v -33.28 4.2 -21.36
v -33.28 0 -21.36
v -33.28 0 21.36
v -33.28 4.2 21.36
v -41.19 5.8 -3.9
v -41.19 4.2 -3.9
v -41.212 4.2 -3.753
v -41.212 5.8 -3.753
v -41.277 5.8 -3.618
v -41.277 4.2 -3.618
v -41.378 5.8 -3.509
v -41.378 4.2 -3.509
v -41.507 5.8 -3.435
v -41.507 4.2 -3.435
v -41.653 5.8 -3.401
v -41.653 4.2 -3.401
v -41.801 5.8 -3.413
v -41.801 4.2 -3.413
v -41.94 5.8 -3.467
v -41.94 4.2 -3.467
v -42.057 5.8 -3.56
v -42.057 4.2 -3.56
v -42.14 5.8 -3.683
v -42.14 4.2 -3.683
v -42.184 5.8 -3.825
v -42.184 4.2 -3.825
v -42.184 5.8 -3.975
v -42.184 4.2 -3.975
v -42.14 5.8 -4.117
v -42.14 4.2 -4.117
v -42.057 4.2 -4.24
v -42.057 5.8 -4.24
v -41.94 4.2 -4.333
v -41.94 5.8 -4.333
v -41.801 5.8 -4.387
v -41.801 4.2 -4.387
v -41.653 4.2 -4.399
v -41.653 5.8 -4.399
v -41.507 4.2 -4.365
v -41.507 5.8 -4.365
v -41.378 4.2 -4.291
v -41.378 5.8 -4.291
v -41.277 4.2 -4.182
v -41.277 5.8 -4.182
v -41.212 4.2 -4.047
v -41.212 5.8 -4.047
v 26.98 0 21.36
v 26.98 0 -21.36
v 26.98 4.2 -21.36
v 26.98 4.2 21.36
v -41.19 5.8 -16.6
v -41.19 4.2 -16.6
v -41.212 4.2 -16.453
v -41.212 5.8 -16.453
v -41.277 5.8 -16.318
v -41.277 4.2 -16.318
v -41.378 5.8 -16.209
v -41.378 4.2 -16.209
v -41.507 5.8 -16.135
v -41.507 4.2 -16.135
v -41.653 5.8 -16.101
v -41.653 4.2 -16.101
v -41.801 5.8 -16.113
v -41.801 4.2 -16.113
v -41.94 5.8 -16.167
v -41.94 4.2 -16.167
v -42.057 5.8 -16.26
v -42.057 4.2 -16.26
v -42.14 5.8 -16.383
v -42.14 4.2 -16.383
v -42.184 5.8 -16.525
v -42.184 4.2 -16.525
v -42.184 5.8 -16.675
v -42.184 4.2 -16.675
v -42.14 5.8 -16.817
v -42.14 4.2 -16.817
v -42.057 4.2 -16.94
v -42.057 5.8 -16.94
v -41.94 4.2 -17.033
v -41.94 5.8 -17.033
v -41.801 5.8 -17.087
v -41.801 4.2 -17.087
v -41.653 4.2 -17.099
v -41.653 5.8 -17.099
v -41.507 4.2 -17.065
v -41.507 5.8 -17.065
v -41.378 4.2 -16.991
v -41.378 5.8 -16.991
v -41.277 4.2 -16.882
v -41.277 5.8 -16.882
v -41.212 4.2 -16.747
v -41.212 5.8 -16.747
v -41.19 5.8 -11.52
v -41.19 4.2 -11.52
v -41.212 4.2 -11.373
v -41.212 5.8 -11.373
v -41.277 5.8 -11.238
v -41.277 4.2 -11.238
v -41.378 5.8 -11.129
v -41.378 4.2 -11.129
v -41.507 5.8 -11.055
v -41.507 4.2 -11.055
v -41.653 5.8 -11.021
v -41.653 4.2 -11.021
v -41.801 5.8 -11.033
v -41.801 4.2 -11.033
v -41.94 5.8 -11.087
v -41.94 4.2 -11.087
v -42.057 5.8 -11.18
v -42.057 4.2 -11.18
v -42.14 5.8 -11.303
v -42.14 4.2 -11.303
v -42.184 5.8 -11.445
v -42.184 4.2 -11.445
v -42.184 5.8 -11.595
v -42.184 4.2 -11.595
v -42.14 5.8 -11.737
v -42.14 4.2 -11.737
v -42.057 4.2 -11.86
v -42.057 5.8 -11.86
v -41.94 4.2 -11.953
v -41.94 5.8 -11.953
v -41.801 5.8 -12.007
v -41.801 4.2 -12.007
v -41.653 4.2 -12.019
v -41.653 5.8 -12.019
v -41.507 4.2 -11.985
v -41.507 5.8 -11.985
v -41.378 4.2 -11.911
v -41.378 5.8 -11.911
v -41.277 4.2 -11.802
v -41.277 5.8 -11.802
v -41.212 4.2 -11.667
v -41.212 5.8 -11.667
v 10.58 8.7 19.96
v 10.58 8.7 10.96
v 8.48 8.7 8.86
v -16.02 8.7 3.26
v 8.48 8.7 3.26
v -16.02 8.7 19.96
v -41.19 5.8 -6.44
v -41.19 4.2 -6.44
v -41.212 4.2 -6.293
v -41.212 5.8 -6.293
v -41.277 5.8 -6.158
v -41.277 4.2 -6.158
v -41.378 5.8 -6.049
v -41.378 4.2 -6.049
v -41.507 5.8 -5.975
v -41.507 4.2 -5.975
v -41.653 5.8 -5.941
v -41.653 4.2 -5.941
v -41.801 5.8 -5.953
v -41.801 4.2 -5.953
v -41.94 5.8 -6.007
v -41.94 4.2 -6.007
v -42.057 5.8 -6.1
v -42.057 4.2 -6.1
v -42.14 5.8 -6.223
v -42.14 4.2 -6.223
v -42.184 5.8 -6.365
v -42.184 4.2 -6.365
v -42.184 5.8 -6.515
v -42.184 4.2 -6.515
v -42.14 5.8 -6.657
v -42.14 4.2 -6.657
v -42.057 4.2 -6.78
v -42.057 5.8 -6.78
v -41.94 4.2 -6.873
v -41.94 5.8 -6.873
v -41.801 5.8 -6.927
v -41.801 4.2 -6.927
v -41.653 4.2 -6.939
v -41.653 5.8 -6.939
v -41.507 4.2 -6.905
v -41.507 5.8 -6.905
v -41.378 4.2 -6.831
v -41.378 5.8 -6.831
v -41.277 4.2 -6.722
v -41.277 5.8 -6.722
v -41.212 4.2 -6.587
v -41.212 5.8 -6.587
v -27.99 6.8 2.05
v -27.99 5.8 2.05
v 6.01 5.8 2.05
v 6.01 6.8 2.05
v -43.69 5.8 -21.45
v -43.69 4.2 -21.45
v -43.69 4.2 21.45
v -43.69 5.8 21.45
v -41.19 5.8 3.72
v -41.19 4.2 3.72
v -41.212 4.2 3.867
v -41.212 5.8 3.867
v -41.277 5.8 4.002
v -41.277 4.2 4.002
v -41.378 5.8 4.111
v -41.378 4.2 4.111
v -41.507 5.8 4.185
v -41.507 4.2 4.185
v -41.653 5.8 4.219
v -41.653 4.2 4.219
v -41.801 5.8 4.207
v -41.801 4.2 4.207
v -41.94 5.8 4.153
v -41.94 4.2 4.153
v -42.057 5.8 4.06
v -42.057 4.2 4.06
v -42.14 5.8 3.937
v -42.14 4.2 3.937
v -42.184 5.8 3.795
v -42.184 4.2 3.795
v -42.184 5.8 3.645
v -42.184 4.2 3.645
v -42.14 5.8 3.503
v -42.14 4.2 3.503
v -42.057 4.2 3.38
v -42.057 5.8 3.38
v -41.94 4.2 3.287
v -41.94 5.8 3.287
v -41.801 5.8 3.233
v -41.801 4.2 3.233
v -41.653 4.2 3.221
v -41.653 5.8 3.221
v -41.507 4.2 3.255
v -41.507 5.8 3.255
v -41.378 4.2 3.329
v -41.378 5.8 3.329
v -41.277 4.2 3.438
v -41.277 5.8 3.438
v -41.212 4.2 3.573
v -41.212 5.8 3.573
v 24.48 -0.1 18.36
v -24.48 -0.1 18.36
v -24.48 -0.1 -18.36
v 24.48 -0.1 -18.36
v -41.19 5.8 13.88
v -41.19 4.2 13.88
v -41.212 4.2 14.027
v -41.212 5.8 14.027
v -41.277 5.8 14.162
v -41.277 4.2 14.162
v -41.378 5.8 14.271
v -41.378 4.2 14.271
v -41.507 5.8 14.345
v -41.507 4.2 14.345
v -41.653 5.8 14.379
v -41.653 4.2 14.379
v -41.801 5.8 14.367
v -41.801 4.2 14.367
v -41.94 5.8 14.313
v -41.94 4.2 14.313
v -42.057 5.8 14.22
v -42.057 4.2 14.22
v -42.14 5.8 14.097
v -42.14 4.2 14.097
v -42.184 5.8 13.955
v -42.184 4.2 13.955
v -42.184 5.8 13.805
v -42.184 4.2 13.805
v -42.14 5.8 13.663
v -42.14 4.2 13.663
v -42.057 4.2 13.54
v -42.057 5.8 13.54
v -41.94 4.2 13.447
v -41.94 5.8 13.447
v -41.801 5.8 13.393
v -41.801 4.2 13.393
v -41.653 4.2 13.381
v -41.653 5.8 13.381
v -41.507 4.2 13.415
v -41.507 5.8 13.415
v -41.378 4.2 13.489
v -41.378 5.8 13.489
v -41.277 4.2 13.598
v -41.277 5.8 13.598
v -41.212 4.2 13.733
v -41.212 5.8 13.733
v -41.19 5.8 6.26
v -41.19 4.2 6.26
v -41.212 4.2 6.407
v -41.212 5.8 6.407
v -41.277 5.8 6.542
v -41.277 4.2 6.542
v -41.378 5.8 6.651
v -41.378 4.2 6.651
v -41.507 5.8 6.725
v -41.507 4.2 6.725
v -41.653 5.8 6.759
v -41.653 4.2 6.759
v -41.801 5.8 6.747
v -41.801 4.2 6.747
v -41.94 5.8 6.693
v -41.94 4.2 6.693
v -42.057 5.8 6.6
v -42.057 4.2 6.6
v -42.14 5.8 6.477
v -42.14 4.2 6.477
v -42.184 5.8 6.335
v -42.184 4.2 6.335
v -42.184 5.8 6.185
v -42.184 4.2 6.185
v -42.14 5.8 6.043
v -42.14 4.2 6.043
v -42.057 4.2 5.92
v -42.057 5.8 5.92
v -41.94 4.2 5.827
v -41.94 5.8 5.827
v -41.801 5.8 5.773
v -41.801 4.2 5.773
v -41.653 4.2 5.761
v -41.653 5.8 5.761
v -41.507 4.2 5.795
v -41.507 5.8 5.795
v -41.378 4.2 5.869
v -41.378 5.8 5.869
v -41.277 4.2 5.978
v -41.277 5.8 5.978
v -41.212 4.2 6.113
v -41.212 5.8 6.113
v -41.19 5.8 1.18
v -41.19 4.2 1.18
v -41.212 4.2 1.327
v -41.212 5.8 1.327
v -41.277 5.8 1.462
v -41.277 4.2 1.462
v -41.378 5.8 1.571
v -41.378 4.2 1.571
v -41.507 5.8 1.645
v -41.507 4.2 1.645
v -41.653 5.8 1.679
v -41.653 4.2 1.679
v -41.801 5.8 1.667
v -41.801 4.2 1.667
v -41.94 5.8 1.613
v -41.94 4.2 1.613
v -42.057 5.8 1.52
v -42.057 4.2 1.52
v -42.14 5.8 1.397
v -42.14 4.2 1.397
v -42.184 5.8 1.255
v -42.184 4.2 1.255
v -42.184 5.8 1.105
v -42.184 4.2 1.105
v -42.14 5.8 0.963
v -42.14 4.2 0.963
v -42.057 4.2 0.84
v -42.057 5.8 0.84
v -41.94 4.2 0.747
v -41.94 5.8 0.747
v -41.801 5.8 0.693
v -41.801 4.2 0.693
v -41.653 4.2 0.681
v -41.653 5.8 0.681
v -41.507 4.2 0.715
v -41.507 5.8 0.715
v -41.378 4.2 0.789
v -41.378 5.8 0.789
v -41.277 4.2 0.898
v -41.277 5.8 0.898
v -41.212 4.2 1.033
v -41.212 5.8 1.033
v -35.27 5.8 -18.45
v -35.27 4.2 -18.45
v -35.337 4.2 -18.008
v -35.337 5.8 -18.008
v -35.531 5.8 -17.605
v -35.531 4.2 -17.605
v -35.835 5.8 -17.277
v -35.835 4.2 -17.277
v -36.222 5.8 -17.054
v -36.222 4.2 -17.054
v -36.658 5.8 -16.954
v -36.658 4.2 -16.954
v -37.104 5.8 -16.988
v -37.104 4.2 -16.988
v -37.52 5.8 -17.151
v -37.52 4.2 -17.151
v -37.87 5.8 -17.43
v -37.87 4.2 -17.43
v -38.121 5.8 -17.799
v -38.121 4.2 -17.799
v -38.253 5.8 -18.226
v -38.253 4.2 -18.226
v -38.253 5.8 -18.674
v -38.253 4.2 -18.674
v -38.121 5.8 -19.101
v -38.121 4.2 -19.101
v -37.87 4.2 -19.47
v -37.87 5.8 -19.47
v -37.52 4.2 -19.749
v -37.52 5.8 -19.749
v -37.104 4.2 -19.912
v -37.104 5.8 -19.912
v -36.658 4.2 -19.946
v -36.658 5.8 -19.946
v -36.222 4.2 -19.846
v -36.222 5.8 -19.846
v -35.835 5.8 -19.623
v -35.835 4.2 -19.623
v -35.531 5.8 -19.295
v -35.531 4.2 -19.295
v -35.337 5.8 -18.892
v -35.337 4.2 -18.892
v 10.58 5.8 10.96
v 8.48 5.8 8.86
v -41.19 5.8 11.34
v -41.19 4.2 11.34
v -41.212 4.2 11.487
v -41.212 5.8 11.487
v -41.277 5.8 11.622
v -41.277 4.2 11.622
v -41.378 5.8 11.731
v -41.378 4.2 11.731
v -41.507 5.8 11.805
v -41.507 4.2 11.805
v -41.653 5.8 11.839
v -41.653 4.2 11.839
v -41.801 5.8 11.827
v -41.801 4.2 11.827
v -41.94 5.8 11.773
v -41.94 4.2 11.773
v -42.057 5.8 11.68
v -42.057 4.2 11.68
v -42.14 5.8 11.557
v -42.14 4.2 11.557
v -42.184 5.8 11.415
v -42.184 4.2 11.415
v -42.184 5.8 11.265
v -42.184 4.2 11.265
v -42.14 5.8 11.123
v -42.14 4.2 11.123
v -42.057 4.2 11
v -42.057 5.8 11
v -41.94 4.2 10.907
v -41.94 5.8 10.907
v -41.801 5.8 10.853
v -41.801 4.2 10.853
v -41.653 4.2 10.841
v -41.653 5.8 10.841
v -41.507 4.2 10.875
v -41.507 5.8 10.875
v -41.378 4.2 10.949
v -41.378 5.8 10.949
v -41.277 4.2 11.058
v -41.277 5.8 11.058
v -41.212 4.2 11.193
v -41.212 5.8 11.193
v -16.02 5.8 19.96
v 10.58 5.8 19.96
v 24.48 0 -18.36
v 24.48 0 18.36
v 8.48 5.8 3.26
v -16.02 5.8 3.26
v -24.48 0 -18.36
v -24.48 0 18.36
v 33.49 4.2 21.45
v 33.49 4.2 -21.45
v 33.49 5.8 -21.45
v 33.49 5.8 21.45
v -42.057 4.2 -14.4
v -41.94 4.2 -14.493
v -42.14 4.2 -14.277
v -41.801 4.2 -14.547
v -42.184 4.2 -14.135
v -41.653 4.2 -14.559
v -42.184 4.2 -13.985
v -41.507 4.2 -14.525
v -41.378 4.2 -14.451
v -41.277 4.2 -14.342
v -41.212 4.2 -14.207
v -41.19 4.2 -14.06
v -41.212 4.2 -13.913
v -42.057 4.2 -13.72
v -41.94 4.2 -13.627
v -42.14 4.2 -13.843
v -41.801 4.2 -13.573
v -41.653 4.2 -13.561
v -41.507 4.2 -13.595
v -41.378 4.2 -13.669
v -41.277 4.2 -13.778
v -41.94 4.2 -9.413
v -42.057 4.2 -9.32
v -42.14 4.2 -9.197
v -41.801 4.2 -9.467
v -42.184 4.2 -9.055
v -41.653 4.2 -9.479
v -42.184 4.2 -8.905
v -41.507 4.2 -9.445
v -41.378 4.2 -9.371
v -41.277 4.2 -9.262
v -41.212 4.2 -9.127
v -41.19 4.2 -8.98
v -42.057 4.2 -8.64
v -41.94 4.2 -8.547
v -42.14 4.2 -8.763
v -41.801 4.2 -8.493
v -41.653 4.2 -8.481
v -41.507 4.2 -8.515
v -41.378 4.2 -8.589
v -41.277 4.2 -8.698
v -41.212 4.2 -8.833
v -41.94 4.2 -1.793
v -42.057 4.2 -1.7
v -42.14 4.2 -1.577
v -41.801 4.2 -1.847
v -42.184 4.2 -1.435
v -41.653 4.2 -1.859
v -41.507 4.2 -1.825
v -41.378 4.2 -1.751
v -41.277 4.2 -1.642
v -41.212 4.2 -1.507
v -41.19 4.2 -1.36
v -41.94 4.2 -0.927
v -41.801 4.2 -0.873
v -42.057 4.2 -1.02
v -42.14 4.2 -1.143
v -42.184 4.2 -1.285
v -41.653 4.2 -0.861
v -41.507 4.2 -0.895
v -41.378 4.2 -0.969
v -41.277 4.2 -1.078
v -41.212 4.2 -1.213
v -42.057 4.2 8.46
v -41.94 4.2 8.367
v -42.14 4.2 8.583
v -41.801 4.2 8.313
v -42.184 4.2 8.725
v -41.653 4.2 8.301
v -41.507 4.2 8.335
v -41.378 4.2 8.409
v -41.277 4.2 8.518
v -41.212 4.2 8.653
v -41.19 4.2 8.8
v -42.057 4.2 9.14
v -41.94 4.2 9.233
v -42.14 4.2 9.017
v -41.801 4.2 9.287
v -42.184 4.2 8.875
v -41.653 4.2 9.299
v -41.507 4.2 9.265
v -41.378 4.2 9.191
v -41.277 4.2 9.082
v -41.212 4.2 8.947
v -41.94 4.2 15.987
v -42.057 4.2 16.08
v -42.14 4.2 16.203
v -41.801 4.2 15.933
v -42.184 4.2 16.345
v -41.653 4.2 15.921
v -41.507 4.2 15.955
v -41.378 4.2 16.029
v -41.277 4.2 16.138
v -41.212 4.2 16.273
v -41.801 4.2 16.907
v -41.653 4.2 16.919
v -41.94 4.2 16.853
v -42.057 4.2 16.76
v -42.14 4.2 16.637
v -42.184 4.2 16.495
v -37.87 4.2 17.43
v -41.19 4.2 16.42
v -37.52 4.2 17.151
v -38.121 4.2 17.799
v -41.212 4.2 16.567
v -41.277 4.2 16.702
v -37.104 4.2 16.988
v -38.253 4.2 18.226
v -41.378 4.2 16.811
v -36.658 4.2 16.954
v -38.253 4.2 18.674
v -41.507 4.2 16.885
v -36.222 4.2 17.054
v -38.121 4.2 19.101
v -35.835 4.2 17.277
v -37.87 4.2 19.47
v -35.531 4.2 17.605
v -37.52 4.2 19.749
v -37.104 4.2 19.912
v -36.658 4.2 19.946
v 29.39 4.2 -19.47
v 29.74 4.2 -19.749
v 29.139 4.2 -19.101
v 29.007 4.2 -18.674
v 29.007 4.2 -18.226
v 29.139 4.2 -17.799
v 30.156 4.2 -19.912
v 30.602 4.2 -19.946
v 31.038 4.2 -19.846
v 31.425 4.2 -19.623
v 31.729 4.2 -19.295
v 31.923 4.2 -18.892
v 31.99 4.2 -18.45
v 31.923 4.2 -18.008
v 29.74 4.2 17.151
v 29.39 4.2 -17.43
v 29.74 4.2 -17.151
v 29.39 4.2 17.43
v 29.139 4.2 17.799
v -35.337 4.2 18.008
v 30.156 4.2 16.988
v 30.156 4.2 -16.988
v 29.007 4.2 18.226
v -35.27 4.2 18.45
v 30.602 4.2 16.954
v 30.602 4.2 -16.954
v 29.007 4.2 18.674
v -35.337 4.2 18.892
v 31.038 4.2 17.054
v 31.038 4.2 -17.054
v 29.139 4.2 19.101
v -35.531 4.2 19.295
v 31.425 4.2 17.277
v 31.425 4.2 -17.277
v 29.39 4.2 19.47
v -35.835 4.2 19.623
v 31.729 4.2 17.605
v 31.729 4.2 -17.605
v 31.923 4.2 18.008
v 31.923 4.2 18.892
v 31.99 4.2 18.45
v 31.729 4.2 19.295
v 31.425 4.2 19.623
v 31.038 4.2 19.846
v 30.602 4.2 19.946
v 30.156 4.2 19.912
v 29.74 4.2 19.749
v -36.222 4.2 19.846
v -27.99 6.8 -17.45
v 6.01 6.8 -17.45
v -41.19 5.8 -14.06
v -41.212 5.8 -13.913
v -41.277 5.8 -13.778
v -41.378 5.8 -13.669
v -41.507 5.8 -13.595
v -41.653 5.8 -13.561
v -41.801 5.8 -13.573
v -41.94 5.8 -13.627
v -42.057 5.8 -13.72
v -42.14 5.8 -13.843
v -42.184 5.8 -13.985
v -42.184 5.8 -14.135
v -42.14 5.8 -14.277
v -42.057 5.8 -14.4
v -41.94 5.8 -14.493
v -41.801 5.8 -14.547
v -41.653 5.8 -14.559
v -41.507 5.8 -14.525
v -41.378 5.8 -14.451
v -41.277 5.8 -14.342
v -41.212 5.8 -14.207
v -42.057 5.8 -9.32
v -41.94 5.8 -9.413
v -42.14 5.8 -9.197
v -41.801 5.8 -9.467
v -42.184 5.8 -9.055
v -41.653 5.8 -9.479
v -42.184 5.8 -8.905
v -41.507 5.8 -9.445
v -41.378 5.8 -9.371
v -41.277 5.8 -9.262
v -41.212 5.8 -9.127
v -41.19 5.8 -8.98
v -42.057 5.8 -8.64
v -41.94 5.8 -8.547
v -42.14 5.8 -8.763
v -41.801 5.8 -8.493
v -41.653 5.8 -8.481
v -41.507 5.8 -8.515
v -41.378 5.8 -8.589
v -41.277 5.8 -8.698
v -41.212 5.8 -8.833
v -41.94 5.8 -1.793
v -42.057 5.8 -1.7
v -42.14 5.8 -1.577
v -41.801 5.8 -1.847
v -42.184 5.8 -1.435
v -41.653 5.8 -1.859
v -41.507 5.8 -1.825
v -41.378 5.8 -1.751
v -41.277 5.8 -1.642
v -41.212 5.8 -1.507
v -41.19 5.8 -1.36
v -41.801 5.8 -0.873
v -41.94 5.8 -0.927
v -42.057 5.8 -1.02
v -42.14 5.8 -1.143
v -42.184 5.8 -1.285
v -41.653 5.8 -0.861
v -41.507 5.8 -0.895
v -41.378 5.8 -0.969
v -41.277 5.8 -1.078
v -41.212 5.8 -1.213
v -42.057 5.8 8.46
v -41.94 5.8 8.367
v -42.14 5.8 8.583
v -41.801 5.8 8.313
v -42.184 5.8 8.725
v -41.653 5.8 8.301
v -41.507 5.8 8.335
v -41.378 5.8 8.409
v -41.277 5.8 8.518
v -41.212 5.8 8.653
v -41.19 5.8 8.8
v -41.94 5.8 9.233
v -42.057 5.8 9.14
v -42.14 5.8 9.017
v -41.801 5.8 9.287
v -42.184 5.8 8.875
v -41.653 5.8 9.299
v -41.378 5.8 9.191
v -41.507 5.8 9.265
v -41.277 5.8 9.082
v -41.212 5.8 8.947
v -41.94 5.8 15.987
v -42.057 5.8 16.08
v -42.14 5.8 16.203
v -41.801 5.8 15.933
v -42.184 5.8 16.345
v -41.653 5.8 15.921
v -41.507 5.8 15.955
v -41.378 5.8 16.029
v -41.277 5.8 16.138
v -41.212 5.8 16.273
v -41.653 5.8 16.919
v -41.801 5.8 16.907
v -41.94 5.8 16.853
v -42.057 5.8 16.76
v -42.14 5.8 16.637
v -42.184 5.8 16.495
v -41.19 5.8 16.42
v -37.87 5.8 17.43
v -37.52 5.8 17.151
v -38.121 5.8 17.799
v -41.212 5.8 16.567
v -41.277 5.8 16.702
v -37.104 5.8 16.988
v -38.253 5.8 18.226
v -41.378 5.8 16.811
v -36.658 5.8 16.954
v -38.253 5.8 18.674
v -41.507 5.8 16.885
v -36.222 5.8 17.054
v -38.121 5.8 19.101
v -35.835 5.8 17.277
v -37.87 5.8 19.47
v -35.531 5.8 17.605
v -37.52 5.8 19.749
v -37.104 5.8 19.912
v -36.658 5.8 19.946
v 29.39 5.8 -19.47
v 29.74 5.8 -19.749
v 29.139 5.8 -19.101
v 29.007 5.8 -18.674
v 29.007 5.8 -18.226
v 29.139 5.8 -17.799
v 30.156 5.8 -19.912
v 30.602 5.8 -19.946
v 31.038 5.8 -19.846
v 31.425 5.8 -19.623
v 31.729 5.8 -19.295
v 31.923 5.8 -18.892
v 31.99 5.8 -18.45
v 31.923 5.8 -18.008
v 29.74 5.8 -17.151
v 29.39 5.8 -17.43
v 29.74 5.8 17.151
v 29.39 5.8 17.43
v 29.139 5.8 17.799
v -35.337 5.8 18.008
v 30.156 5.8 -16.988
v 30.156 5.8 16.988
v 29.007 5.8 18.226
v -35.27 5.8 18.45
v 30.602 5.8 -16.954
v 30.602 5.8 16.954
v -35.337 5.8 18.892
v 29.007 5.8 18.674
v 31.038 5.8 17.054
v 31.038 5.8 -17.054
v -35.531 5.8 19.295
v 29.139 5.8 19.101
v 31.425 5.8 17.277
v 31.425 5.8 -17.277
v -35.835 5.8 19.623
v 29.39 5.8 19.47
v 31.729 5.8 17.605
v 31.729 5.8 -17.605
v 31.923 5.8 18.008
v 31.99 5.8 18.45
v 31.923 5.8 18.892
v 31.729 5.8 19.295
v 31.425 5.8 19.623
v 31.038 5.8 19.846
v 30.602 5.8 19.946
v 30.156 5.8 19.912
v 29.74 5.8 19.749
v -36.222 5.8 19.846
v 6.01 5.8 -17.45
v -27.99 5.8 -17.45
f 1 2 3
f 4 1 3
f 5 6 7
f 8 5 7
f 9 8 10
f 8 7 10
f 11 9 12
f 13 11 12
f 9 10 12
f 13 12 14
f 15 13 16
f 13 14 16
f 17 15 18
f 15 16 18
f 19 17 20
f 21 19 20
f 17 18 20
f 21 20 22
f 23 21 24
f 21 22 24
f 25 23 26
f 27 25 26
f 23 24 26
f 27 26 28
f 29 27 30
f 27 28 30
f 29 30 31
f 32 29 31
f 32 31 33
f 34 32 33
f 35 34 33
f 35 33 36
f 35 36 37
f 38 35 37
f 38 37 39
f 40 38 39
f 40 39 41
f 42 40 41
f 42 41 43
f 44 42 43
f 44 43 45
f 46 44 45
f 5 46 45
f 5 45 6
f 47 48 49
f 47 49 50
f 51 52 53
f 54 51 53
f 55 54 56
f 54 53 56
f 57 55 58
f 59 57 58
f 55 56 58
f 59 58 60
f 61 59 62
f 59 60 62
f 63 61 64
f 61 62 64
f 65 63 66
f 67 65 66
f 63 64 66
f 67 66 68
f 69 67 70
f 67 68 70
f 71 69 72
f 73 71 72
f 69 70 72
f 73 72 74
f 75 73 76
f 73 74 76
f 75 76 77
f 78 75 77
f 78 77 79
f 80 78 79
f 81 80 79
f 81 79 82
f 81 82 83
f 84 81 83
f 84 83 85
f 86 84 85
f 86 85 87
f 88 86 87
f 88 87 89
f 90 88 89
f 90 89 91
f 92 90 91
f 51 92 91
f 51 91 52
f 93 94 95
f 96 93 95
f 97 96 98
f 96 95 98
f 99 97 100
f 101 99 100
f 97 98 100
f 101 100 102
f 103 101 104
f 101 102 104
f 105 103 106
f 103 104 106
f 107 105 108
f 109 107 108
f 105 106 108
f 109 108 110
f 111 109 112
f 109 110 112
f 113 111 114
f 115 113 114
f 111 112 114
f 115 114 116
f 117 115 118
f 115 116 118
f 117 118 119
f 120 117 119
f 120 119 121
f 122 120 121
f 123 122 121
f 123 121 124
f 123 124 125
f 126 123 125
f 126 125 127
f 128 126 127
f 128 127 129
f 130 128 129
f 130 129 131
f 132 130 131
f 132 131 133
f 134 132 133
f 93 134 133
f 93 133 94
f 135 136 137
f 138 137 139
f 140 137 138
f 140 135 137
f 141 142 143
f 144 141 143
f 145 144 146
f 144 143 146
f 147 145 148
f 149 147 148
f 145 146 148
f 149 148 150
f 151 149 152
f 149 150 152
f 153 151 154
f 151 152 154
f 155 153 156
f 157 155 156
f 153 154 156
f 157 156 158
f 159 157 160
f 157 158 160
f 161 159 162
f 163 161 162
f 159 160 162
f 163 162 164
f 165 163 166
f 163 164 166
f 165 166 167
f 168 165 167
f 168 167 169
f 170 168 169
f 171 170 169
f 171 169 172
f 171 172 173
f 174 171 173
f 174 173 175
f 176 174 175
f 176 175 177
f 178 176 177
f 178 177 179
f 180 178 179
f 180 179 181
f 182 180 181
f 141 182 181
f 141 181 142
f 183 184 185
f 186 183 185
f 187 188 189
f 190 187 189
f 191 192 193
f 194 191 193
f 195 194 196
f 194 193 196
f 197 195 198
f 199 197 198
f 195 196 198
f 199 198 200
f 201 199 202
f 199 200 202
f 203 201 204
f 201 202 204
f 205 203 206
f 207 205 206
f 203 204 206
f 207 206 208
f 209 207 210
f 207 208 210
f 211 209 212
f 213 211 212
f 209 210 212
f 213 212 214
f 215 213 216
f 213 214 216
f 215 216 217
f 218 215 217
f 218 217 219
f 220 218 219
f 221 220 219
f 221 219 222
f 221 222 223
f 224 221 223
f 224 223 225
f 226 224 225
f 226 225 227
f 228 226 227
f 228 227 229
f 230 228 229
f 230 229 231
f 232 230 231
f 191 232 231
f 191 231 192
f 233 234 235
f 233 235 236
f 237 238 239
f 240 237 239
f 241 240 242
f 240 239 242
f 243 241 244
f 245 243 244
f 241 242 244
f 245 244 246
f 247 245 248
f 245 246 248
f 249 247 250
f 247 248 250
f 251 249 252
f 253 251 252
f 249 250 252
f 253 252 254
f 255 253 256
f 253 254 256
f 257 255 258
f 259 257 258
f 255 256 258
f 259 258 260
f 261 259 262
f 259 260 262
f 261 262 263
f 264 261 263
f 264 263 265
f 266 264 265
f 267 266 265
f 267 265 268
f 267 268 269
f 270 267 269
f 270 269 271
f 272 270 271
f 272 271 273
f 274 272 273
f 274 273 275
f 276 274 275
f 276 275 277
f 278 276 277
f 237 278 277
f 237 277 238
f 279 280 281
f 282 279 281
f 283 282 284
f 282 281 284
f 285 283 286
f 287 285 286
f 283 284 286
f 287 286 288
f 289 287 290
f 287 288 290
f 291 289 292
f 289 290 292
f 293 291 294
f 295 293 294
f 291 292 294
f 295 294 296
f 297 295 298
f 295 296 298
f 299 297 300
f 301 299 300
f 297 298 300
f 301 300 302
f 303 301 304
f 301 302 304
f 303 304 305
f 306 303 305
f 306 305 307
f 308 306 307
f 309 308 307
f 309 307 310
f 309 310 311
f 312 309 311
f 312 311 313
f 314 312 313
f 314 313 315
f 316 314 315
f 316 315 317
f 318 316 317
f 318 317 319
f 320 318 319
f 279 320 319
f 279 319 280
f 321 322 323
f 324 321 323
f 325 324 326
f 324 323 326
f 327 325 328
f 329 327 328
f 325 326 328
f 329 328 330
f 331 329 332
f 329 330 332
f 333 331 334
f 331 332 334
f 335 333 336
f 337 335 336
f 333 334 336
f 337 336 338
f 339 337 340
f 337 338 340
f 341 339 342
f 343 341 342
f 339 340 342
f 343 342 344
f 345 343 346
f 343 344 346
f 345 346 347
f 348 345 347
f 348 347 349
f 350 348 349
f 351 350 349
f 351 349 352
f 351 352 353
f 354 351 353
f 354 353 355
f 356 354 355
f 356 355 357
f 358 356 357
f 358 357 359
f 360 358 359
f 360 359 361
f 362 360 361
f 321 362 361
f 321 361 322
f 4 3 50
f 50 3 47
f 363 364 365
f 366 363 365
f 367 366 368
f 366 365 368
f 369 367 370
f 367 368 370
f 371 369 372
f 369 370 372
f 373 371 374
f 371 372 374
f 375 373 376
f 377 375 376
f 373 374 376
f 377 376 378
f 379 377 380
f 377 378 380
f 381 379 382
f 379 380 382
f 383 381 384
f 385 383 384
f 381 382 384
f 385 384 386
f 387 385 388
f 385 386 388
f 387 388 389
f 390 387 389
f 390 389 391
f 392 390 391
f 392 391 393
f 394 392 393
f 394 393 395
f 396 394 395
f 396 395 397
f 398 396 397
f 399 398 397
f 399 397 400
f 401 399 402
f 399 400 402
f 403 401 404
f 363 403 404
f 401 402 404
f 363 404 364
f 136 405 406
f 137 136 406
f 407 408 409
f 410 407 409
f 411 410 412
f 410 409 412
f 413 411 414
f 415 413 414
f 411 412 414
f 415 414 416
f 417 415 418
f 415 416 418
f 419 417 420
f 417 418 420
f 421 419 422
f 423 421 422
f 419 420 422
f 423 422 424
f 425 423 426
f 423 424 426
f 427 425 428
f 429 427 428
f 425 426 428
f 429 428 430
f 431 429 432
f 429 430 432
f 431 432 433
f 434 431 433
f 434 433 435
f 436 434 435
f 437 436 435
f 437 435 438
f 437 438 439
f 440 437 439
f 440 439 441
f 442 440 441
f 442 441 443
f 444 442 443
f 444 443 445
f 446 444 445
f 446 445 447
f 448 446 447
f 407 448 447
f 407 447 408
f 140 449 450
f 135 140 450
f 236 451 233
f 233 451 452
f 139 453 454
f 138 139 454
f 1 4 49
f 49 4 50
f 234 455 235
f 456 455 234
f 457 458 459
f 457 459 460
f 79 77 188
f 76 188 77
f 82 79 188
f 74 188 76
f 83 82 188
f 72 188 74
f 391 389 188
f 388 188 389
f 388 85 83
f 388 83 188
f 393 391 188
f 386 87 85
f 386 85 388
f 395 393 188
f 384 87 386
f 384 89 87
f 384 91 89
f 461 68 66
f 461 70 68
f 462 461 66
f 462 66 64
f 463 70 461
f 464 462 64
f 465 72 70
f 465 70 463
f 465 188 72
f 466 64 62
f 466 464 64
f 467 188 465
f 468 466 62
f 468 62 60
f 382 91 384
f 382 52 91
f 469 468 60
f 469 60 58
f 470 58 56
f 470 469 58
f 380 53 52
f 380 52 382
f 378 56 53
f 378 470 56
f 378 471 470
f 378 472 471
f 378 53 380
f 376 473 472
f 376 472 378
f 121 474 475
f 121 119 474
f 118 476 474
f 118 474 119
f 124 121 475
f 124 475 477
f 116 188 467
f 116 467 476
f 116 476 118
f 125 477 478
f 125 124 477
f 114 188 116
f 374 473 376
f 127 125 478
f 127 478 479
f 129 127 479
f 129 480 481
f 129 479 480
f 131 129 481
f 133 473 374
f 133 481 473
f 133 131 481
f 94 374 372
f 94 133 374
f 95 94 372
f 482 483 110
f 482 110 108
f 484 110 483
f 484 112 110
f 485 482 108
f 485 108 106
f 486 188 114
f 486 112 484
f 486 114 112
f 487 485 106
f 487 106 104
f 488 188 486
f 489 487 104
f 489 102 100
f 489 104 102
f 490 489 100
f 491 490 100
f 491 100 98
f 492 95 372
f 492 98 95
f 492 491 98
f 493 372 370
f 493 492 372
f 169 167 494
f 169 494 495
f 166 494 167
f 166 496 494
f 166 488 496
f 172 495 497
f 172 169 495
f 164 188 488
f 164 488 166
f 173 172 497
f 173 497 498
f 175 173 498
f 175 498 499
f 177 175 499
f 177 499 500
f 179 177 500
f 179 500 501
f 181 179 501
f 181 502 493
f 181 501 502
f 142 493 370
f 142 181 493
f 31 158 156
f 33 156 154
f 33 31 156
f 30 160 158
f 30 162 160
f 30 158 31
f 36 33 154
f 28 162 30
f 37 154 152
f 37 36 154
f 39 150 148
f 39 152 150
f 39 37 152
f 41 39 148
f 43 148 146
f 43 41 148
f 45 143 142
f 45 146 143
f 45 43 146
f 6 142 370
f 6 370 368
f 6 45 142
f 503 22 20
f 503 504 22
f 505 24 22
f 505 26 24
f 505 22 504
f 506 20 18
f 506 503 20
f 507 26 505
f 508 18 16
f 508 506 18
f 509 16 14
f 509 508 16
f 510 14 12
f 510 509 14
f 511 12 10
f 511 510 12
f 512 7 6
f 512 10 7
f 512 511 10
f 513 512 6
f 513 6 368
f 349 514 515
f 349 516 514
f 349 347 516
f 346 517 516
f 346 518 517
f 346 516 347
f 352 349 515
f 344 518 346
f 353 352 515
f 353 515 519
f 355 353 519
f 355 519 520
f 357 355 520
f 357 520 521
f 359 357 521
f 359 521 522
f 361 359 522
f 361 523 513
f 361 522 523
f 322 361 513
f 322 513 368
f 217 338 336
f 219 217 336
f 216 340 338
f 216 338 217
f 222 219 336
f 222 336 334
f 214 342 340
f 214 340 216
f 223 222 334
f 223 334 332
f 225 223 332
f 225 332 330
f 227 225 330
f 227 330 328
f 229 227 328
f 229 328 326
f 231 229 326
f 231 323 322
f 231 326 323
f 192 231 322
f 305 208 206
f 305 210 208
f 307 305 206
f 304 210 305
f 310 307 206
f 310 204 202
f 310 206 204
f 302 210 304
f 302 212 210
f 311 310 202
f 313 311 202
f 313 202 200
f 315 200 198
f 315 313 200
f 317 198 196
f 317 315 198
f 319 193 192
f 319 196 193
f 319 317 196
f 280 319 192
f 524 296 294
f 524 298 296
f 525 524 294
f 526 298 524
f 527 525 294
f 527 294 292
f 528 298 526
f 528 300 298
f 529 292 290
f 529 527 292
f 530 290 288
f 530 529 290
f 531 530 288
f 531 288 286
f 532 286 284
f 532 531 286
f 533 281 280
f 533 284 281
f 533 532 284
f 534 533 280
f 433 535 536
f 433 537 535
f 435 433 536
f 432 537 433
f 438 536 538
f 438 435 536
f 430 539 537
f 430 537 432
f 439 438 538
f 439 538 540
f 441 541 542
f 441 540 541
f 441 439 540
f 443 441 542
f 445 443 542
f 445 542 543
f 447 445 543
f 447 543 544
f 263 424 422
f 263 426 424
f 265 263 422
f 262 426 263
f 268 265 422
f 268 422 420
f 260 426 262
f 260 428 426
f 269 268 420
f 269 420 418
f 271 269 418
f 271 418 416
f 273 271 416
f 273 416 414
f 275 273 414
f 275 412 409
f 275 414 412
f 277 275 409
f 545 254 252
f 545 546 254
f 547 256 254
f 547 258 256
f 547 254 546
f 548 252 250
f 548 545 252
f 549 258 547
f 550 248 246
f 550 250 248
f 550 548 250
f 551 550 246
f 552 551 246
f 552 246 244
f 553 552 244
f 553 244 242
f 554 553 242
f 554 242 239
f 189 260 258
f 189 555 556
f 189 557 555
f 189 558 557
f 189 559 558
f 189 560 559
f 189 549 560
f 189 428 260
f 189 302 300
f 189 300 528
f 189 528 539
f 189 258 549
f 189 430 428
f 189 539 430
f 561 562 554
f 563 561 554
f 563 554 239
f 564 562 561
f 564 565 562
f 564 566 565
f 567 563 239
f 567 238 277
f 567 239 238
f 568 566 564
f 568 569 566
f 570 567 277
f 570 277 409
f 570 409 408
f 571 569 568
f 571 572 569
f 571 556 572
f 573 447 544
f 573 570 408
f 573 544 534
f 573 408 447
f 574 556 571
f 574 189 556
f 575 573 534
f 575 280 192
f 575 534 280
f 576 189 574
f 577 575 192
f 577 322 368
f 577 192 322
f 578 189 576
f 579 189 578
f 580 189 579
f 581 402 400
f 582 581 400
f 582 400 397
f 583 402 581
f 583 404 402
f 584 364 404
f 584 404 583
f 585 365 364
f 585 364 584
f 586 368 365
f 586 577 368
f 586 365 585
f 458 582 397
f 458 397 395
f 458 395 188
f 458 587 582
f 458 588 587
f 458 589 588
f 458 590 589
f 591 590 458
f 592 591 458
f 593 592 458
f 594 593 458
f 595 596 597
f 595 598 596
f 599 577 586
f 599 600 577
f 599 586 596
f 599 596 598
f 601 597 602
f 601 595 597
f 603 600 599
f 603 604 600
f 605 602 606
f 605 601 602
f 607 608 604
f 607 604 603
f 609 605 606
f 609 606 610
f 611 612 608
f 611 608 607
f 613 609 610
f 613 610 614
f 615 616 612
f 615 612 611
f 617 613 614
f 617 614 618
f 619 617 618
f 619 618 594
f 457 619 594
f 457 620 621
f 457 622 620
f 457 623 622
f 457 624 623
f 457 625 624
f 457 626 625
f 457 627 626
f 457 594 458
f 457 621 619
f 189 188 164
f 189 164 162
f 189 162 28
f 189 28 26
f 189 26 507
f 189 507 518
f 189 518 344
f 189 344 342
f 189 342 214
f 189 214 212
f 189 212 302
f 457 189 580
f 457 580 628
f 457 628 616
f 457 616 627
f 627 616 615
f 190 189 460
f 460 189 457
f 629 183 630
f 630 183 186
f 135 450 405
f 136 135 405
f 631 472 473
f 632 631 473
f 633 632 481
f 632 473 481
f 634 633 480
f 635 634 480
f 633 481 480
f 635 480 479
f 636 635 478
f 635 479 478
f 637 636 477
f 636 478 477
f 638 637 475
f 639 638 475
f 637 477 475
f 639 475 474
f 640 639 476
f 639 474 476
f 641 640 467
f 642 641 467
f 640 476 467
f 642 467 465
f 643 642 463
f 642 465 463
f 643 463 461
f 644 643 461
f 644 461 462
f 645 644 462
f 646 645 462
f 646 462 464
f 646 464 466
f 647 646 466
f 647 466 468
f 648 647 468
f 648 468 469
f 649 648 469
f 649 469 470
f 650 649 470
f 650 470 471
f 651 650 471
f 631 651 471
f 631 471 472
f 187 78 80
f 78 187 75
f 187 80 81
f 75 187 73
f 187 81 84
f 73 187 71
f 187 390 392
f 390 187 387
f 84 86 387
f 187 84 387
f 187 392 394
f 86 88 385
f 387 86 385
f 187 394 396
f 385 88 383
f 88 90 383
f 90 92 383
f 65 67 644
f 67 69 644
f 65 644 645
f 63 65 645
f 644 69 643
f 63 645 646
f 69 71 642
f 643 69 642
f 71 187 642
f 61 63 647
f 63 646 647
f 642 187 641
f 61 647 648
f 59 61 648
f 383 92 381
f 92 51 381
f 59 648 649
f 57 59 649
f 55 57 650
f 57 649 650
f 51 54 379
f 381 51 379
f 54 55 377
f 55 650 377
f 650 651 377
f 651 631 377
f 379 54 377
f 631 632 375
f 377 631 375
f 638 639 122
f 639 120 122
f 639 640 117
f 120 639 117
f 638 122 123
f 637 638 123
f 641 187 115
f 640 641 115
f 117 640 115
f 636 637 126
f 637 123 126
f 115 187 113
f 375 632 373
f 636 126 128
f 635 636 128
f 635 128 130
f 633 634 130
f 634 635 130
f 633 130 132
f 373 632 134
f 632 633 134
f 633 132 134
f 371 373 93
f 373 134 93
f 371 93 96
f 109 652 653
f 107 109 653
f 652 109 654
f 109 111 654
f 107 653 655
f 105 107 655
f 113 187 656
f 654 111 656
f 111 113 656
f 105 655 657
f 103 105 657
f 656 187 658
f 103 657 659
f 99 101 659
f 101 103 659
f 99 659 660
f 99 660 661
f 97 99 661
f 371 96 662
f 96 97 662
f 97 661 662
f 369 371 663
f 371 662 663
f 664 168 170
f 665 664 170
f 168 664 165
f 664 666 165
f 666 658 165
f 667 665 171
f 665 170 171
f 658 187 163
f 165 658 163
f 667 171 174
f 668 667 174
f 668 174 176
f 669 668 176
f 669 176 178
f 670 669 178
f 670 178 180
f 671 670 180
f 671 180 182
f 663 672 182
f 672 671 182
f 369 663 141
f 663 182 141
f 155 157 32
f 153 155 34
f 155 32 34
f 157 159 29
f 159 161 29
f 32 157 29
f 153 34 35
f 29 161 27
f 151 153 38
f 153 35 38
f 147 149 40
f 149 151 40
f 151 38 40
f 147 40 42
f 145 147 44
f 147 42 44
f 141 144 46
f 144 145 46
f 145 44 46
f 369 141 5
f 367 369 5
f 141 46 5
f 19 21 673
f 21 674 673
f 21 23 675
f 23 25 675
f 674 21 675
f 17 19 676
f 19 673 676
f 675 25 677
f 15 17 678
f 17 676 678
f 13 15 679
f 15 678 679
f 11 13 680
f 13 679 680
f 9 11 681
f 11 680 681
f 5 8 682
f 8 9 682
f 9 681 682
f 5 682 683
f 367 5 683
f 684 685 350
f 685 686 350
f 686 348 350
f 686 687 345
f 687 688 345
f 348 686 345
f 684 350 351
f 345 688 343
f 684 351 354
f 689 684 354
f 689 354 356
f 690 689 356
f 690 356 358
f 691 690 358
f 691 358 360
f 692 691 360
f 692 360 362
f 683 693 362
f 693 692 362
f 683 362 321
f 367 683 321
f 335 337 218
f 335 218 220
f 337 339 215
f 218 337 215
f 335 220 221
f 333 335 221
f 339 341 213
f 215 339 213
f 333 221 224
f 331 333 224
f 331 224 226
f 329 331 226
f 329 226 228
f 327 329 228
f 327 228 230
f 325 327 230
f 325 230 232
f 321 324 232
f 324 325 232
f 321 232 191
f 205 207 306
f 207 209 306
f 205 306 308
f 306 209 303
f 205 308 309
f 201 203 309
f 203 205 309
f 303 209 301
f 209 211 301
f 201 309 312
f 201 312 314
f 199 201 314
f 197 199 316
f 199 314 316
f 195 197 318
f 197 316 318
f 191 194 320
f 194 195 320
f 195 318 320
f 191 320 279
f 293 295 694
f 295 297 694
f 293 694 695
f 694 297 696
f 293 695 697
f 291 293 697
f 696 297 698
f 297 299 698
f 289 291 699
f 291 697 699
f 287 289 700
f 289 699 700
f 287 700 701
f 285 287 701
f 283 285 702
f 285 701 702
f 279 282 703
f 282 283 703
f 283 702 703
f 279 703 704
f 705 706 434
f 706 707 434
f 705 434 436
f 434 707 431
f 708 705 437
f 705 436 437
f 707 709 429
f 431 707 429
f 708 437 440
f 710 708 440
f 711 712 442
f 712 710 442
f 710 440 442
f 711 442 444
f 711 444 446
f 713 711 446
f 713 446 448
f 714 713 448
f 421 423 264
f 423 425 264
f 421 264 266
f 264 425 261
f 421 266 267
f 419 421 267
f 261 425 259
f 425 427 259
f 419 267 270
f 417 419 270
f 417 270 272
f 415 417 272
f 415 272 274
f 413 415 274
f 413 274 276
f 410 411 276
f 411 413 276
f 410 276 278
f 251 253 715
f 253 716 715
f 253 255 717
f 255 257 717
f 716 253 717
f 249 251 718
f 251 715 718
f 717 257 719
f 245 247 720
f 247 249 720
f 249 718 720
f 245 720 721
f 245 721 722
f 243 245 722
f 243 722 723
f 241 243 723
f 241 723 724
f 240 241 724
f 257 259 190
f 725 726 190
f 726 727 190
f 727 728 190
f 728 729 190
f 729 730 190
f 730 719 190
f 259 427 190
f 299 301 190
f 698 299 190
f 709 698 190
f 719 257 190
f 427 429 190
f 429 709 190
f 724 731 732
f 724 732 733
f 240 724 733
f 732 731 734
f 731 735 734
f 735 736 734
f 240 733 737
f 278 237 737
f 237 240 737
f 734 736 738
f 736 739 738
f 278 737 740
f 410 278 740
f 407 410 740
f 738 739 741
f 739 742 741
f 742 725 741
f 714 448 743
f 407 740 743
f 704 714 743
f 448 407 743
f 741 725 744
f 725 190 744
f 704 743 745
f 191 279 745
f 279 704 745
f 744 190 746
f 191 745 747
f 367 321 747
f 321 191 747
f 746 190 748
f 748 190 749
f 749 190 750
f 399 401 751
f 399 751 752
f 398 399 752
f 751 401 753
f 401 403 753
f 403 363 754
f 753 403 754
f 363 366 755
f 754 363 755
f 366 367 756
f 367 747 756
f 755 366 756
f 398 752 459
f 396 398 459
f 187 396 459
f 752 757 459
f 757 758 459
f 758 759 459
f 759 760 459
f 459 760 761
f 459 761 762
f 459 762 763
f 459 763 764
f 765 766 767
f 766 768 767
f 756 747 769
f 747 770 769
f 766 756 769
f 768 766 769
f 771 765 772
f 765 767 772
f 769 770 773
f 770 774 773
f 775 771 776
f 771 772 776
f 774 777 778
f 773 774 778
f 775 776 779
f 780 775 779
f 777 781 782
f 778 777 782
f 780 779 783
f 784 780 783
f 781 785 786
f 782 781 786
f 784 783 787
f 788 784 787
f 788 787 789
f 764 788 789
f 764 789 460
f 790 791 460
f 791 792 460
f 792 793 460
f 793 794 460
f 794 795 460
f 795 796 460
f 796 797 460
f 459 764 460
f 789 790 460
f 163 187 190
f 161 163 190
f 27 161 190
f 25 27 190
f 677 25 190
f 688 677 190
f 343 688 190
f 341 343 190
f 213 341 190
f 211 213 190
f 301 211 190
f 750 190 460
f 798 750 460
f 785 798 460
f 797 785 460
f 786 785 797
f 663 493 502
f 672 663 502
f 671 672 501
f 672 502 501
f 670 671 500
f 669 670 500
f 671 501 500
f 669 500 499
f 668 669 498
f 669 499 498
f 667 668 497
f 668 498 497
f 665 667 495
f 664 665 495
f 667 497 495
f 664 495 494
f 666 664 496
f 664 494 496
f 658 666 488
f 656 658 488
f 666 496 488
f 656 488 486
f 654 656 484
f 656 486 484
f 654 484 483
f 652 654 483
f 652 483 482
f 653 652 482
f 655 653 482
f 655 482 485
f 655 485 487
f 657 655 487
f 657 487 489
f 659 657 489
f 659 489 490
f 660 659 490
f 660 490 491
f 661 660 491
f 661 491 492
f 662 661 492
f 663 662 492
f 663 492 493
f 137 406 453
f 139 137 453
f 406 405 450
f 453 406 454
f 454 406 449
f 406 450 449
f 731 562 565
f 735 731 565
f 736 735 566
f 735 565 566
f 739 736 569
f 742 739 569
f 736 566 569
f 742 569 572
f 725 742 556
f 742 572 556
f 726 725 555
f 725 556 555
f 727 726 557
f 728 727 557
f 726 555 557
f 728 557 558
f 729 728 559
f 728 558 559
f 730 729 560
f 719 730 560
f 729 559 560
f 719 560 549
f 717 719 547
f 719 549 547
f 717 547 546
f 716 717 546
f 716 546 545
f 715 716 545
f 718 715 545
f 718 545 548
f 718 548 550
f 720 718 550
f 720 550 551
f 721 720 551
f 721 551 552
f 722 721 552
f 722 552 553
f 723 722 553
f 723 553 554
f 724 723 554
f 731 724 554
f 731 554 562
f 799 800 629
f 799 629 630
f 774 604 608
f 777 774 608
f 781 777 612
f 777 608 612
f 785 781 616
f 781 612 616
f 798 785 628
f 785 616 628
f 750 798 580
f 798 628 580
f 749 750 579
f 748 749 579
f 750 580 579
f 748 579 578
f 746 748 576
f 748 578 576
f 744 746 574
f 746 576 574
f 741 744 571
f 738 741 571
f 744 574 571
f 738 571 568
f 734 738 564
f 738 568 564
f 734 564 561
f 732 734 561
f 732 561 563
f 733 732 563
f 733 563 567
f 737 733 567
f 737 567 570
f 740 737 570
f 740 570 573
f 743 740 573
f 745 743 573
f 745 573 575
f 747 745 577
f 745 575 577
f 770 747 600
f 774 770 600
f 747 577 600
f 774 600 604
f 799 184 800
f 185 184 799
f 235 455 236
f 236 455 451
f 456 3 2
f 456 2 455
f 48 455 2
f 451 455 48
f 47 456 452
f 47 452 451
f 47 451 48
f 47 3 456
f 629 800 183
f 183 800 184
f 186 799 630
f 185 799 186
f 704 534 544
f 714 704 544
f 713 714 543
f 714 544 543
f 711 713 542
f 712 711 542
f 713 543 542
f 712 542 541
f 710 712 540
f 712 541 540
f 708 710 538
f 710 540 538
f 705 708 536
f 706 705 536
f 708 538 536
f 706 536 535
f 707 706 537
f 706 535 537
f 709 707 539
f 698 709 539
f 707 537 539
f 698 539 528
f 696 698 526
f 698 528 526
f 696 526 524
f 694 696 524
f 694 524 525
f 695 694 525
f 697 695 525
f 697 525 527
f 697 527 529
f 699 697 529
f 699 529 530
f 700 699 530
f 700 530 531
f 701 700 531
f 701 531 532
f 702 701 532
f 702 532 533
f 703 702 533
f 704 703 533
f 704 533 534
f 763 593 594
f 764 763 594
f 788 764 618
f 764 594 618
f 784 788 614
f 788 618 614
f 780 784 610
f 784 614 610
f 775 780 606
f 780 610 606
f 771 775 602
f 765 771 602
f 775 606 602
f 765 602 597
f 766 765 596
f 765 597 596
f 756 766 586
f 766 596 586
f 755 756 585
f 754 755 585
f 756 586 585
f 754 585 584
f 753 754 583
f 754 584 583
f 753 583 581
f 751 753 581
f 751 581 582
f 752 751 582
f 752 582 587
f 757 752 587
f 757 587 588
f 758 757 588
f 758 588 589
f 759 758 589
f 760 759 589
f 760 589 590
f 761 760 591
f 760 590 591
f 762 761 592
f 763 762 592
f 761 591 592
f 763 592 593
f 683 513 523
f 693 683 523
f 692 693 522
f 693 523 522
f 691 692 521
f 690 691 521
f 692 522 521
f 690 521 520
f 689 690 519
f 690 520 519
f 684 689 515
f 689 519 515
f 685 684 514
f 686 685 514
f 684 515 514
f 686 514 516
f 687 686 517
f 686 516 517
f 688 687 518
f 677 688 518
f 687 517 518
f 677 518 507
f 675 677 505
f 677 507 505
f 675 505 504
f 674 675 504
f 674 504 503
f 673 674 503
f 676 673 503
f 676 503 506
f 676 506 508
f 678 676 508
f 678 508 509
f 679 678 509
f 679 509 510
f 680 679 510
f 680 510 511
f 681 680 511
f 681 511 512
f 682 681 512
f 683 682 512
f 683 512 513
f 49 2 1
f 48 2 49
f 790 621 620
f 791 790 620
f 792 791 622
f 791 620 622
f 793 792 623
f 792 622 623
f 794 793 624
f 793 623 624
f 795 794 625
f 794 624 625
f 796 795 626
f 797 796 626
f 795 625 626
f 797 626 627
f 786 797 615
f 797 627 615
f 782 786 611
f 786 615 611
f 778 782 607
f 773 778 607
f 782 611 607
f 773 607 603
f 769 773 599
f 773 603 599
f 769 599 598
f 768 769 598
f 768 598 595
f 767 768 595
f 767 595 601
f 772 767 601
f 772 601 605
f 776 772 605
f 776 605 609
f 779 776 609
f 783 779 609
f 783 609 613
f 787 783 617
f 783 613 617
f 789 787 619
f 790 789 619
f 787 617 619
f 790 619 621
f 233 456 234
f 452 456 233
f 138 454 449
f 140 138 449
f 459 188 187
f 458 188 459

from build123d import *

# Parameters (mm, degrees)
SKETCH_W            = 60.26
SKETCH_H            = 42.72
PAD_DEPTH           = 4.2
SKETCH001_W         = 48.96
SKETCH001_H         = 36.72
PAD001_DEPTH        = 0.1
SKETCH002_W         = 77.18
SKETCH002_H         = 42.9
SKETCH002_R         = 1.5
PAD002_DEPTH        = 1.6
SKETCH004_R         = 0.5
POCKET_DEPTH        = 5.801
POCKET_DEPTH_BACK   = -0.001
LINEARPATTERN_COUNT = 14
LINEARPATTERN_PITCH = 2.54
PAD003_DEPTH        = 2.9
SKETCH010_W         = 34
SKETCH010_H         = 19.5
PAD004_DEPTH        = 1


with BuildPart() as glass:
    # Sketch → Pad (new body)
    with BuildSketch(Plane.XZ):
        with Locations((-3.15, 0)):
            Rectangle(SKETCH_W, SKETCH_H)
    extrude(amount=-PAD_DEPTH)

    # Sketch001 → Pad001 (join)
    with BuildSketch(Plane.XZ):
        Rectangle(SKETCH001_W, SKETCH001_H)
    extrude(amount=PAD001_DEPTH)


with BuildPart() as pcb:
    # Sketch002 → Pad002 (new body)
    with BuildSketch(Plane.XZ.offset(-4.2)):
        with Locations((-5.1, 0)):
            Rectangle(SKETCH002_W, SKETCH002_H)
        with Locations((30.49, 18.45)):
            Circle(SKETCH002_R, mode=Mode.SUBTRACT)
        with Locations((30.49, -18.45)):
            Circle(SKETCH002_R, mode=Mode.SUBTRACT)
        with Locations((-36.77, -18.45)):
            Circle(SKETCH002_R, mode=Mode.SUBTRACT)
        with Locations((-36.77, 18.45)):
            Circle(SKETCH002_R, mode=Mode.SUBTRACT)
    extrude(amount=-PAD002_DEPTH)

    # Sketch004 → Pocket (cut, two sides)
    with BuildSketch(Plane.XZ) as pocket_sk:
        with Locations((-41.69, -16.6)):
            Circle(SKETCH004_R)
    pocket = extrude(amount=-POCKET_DEPTH, mode=Mode.SUBTRACT)
    extrude(pocket_sk.sketch, amount=-POCKET_DEPTH_BACK, mode=Mode.SUBTRACT)

    # LinearPattern: Pocket ×14
    with Locations(*[(0, 0, i * LINEARPATTERN_PITCH) for i in range(1, LINEARPATTERN_COUNT)]):
        add(pocket, mode=Mode.SUBTRACT)


with BuildPart() as sd_card_slot:
    # Sketch005 → Pad003 (new body)
    with BuildSketch(Plane.XZ.offset(-5.8)):
        Polygon((-16.02, 19.96), (10.58, 19.96), (10.58, 10.96), (8.48, 8.86), (8.48, 3.26), (-16.02, 3.26), align=None)
    extrude(amount=-PAD003_DEPTH)


with BuildPart() as components:
    # Sketch010 → Pad004 (new body)
    with BuildSketch(Plane.XZ.offset(-5.8)):
        with Locations((-10.99, -7.7)):
            Rectangle(SKETCH010_W, SKETCH010_H)
    extrude(amount=-PAD004_DEPTH)


solid = Compound([glass.part, pcb.part, sd_card_slot.part, components.part])
